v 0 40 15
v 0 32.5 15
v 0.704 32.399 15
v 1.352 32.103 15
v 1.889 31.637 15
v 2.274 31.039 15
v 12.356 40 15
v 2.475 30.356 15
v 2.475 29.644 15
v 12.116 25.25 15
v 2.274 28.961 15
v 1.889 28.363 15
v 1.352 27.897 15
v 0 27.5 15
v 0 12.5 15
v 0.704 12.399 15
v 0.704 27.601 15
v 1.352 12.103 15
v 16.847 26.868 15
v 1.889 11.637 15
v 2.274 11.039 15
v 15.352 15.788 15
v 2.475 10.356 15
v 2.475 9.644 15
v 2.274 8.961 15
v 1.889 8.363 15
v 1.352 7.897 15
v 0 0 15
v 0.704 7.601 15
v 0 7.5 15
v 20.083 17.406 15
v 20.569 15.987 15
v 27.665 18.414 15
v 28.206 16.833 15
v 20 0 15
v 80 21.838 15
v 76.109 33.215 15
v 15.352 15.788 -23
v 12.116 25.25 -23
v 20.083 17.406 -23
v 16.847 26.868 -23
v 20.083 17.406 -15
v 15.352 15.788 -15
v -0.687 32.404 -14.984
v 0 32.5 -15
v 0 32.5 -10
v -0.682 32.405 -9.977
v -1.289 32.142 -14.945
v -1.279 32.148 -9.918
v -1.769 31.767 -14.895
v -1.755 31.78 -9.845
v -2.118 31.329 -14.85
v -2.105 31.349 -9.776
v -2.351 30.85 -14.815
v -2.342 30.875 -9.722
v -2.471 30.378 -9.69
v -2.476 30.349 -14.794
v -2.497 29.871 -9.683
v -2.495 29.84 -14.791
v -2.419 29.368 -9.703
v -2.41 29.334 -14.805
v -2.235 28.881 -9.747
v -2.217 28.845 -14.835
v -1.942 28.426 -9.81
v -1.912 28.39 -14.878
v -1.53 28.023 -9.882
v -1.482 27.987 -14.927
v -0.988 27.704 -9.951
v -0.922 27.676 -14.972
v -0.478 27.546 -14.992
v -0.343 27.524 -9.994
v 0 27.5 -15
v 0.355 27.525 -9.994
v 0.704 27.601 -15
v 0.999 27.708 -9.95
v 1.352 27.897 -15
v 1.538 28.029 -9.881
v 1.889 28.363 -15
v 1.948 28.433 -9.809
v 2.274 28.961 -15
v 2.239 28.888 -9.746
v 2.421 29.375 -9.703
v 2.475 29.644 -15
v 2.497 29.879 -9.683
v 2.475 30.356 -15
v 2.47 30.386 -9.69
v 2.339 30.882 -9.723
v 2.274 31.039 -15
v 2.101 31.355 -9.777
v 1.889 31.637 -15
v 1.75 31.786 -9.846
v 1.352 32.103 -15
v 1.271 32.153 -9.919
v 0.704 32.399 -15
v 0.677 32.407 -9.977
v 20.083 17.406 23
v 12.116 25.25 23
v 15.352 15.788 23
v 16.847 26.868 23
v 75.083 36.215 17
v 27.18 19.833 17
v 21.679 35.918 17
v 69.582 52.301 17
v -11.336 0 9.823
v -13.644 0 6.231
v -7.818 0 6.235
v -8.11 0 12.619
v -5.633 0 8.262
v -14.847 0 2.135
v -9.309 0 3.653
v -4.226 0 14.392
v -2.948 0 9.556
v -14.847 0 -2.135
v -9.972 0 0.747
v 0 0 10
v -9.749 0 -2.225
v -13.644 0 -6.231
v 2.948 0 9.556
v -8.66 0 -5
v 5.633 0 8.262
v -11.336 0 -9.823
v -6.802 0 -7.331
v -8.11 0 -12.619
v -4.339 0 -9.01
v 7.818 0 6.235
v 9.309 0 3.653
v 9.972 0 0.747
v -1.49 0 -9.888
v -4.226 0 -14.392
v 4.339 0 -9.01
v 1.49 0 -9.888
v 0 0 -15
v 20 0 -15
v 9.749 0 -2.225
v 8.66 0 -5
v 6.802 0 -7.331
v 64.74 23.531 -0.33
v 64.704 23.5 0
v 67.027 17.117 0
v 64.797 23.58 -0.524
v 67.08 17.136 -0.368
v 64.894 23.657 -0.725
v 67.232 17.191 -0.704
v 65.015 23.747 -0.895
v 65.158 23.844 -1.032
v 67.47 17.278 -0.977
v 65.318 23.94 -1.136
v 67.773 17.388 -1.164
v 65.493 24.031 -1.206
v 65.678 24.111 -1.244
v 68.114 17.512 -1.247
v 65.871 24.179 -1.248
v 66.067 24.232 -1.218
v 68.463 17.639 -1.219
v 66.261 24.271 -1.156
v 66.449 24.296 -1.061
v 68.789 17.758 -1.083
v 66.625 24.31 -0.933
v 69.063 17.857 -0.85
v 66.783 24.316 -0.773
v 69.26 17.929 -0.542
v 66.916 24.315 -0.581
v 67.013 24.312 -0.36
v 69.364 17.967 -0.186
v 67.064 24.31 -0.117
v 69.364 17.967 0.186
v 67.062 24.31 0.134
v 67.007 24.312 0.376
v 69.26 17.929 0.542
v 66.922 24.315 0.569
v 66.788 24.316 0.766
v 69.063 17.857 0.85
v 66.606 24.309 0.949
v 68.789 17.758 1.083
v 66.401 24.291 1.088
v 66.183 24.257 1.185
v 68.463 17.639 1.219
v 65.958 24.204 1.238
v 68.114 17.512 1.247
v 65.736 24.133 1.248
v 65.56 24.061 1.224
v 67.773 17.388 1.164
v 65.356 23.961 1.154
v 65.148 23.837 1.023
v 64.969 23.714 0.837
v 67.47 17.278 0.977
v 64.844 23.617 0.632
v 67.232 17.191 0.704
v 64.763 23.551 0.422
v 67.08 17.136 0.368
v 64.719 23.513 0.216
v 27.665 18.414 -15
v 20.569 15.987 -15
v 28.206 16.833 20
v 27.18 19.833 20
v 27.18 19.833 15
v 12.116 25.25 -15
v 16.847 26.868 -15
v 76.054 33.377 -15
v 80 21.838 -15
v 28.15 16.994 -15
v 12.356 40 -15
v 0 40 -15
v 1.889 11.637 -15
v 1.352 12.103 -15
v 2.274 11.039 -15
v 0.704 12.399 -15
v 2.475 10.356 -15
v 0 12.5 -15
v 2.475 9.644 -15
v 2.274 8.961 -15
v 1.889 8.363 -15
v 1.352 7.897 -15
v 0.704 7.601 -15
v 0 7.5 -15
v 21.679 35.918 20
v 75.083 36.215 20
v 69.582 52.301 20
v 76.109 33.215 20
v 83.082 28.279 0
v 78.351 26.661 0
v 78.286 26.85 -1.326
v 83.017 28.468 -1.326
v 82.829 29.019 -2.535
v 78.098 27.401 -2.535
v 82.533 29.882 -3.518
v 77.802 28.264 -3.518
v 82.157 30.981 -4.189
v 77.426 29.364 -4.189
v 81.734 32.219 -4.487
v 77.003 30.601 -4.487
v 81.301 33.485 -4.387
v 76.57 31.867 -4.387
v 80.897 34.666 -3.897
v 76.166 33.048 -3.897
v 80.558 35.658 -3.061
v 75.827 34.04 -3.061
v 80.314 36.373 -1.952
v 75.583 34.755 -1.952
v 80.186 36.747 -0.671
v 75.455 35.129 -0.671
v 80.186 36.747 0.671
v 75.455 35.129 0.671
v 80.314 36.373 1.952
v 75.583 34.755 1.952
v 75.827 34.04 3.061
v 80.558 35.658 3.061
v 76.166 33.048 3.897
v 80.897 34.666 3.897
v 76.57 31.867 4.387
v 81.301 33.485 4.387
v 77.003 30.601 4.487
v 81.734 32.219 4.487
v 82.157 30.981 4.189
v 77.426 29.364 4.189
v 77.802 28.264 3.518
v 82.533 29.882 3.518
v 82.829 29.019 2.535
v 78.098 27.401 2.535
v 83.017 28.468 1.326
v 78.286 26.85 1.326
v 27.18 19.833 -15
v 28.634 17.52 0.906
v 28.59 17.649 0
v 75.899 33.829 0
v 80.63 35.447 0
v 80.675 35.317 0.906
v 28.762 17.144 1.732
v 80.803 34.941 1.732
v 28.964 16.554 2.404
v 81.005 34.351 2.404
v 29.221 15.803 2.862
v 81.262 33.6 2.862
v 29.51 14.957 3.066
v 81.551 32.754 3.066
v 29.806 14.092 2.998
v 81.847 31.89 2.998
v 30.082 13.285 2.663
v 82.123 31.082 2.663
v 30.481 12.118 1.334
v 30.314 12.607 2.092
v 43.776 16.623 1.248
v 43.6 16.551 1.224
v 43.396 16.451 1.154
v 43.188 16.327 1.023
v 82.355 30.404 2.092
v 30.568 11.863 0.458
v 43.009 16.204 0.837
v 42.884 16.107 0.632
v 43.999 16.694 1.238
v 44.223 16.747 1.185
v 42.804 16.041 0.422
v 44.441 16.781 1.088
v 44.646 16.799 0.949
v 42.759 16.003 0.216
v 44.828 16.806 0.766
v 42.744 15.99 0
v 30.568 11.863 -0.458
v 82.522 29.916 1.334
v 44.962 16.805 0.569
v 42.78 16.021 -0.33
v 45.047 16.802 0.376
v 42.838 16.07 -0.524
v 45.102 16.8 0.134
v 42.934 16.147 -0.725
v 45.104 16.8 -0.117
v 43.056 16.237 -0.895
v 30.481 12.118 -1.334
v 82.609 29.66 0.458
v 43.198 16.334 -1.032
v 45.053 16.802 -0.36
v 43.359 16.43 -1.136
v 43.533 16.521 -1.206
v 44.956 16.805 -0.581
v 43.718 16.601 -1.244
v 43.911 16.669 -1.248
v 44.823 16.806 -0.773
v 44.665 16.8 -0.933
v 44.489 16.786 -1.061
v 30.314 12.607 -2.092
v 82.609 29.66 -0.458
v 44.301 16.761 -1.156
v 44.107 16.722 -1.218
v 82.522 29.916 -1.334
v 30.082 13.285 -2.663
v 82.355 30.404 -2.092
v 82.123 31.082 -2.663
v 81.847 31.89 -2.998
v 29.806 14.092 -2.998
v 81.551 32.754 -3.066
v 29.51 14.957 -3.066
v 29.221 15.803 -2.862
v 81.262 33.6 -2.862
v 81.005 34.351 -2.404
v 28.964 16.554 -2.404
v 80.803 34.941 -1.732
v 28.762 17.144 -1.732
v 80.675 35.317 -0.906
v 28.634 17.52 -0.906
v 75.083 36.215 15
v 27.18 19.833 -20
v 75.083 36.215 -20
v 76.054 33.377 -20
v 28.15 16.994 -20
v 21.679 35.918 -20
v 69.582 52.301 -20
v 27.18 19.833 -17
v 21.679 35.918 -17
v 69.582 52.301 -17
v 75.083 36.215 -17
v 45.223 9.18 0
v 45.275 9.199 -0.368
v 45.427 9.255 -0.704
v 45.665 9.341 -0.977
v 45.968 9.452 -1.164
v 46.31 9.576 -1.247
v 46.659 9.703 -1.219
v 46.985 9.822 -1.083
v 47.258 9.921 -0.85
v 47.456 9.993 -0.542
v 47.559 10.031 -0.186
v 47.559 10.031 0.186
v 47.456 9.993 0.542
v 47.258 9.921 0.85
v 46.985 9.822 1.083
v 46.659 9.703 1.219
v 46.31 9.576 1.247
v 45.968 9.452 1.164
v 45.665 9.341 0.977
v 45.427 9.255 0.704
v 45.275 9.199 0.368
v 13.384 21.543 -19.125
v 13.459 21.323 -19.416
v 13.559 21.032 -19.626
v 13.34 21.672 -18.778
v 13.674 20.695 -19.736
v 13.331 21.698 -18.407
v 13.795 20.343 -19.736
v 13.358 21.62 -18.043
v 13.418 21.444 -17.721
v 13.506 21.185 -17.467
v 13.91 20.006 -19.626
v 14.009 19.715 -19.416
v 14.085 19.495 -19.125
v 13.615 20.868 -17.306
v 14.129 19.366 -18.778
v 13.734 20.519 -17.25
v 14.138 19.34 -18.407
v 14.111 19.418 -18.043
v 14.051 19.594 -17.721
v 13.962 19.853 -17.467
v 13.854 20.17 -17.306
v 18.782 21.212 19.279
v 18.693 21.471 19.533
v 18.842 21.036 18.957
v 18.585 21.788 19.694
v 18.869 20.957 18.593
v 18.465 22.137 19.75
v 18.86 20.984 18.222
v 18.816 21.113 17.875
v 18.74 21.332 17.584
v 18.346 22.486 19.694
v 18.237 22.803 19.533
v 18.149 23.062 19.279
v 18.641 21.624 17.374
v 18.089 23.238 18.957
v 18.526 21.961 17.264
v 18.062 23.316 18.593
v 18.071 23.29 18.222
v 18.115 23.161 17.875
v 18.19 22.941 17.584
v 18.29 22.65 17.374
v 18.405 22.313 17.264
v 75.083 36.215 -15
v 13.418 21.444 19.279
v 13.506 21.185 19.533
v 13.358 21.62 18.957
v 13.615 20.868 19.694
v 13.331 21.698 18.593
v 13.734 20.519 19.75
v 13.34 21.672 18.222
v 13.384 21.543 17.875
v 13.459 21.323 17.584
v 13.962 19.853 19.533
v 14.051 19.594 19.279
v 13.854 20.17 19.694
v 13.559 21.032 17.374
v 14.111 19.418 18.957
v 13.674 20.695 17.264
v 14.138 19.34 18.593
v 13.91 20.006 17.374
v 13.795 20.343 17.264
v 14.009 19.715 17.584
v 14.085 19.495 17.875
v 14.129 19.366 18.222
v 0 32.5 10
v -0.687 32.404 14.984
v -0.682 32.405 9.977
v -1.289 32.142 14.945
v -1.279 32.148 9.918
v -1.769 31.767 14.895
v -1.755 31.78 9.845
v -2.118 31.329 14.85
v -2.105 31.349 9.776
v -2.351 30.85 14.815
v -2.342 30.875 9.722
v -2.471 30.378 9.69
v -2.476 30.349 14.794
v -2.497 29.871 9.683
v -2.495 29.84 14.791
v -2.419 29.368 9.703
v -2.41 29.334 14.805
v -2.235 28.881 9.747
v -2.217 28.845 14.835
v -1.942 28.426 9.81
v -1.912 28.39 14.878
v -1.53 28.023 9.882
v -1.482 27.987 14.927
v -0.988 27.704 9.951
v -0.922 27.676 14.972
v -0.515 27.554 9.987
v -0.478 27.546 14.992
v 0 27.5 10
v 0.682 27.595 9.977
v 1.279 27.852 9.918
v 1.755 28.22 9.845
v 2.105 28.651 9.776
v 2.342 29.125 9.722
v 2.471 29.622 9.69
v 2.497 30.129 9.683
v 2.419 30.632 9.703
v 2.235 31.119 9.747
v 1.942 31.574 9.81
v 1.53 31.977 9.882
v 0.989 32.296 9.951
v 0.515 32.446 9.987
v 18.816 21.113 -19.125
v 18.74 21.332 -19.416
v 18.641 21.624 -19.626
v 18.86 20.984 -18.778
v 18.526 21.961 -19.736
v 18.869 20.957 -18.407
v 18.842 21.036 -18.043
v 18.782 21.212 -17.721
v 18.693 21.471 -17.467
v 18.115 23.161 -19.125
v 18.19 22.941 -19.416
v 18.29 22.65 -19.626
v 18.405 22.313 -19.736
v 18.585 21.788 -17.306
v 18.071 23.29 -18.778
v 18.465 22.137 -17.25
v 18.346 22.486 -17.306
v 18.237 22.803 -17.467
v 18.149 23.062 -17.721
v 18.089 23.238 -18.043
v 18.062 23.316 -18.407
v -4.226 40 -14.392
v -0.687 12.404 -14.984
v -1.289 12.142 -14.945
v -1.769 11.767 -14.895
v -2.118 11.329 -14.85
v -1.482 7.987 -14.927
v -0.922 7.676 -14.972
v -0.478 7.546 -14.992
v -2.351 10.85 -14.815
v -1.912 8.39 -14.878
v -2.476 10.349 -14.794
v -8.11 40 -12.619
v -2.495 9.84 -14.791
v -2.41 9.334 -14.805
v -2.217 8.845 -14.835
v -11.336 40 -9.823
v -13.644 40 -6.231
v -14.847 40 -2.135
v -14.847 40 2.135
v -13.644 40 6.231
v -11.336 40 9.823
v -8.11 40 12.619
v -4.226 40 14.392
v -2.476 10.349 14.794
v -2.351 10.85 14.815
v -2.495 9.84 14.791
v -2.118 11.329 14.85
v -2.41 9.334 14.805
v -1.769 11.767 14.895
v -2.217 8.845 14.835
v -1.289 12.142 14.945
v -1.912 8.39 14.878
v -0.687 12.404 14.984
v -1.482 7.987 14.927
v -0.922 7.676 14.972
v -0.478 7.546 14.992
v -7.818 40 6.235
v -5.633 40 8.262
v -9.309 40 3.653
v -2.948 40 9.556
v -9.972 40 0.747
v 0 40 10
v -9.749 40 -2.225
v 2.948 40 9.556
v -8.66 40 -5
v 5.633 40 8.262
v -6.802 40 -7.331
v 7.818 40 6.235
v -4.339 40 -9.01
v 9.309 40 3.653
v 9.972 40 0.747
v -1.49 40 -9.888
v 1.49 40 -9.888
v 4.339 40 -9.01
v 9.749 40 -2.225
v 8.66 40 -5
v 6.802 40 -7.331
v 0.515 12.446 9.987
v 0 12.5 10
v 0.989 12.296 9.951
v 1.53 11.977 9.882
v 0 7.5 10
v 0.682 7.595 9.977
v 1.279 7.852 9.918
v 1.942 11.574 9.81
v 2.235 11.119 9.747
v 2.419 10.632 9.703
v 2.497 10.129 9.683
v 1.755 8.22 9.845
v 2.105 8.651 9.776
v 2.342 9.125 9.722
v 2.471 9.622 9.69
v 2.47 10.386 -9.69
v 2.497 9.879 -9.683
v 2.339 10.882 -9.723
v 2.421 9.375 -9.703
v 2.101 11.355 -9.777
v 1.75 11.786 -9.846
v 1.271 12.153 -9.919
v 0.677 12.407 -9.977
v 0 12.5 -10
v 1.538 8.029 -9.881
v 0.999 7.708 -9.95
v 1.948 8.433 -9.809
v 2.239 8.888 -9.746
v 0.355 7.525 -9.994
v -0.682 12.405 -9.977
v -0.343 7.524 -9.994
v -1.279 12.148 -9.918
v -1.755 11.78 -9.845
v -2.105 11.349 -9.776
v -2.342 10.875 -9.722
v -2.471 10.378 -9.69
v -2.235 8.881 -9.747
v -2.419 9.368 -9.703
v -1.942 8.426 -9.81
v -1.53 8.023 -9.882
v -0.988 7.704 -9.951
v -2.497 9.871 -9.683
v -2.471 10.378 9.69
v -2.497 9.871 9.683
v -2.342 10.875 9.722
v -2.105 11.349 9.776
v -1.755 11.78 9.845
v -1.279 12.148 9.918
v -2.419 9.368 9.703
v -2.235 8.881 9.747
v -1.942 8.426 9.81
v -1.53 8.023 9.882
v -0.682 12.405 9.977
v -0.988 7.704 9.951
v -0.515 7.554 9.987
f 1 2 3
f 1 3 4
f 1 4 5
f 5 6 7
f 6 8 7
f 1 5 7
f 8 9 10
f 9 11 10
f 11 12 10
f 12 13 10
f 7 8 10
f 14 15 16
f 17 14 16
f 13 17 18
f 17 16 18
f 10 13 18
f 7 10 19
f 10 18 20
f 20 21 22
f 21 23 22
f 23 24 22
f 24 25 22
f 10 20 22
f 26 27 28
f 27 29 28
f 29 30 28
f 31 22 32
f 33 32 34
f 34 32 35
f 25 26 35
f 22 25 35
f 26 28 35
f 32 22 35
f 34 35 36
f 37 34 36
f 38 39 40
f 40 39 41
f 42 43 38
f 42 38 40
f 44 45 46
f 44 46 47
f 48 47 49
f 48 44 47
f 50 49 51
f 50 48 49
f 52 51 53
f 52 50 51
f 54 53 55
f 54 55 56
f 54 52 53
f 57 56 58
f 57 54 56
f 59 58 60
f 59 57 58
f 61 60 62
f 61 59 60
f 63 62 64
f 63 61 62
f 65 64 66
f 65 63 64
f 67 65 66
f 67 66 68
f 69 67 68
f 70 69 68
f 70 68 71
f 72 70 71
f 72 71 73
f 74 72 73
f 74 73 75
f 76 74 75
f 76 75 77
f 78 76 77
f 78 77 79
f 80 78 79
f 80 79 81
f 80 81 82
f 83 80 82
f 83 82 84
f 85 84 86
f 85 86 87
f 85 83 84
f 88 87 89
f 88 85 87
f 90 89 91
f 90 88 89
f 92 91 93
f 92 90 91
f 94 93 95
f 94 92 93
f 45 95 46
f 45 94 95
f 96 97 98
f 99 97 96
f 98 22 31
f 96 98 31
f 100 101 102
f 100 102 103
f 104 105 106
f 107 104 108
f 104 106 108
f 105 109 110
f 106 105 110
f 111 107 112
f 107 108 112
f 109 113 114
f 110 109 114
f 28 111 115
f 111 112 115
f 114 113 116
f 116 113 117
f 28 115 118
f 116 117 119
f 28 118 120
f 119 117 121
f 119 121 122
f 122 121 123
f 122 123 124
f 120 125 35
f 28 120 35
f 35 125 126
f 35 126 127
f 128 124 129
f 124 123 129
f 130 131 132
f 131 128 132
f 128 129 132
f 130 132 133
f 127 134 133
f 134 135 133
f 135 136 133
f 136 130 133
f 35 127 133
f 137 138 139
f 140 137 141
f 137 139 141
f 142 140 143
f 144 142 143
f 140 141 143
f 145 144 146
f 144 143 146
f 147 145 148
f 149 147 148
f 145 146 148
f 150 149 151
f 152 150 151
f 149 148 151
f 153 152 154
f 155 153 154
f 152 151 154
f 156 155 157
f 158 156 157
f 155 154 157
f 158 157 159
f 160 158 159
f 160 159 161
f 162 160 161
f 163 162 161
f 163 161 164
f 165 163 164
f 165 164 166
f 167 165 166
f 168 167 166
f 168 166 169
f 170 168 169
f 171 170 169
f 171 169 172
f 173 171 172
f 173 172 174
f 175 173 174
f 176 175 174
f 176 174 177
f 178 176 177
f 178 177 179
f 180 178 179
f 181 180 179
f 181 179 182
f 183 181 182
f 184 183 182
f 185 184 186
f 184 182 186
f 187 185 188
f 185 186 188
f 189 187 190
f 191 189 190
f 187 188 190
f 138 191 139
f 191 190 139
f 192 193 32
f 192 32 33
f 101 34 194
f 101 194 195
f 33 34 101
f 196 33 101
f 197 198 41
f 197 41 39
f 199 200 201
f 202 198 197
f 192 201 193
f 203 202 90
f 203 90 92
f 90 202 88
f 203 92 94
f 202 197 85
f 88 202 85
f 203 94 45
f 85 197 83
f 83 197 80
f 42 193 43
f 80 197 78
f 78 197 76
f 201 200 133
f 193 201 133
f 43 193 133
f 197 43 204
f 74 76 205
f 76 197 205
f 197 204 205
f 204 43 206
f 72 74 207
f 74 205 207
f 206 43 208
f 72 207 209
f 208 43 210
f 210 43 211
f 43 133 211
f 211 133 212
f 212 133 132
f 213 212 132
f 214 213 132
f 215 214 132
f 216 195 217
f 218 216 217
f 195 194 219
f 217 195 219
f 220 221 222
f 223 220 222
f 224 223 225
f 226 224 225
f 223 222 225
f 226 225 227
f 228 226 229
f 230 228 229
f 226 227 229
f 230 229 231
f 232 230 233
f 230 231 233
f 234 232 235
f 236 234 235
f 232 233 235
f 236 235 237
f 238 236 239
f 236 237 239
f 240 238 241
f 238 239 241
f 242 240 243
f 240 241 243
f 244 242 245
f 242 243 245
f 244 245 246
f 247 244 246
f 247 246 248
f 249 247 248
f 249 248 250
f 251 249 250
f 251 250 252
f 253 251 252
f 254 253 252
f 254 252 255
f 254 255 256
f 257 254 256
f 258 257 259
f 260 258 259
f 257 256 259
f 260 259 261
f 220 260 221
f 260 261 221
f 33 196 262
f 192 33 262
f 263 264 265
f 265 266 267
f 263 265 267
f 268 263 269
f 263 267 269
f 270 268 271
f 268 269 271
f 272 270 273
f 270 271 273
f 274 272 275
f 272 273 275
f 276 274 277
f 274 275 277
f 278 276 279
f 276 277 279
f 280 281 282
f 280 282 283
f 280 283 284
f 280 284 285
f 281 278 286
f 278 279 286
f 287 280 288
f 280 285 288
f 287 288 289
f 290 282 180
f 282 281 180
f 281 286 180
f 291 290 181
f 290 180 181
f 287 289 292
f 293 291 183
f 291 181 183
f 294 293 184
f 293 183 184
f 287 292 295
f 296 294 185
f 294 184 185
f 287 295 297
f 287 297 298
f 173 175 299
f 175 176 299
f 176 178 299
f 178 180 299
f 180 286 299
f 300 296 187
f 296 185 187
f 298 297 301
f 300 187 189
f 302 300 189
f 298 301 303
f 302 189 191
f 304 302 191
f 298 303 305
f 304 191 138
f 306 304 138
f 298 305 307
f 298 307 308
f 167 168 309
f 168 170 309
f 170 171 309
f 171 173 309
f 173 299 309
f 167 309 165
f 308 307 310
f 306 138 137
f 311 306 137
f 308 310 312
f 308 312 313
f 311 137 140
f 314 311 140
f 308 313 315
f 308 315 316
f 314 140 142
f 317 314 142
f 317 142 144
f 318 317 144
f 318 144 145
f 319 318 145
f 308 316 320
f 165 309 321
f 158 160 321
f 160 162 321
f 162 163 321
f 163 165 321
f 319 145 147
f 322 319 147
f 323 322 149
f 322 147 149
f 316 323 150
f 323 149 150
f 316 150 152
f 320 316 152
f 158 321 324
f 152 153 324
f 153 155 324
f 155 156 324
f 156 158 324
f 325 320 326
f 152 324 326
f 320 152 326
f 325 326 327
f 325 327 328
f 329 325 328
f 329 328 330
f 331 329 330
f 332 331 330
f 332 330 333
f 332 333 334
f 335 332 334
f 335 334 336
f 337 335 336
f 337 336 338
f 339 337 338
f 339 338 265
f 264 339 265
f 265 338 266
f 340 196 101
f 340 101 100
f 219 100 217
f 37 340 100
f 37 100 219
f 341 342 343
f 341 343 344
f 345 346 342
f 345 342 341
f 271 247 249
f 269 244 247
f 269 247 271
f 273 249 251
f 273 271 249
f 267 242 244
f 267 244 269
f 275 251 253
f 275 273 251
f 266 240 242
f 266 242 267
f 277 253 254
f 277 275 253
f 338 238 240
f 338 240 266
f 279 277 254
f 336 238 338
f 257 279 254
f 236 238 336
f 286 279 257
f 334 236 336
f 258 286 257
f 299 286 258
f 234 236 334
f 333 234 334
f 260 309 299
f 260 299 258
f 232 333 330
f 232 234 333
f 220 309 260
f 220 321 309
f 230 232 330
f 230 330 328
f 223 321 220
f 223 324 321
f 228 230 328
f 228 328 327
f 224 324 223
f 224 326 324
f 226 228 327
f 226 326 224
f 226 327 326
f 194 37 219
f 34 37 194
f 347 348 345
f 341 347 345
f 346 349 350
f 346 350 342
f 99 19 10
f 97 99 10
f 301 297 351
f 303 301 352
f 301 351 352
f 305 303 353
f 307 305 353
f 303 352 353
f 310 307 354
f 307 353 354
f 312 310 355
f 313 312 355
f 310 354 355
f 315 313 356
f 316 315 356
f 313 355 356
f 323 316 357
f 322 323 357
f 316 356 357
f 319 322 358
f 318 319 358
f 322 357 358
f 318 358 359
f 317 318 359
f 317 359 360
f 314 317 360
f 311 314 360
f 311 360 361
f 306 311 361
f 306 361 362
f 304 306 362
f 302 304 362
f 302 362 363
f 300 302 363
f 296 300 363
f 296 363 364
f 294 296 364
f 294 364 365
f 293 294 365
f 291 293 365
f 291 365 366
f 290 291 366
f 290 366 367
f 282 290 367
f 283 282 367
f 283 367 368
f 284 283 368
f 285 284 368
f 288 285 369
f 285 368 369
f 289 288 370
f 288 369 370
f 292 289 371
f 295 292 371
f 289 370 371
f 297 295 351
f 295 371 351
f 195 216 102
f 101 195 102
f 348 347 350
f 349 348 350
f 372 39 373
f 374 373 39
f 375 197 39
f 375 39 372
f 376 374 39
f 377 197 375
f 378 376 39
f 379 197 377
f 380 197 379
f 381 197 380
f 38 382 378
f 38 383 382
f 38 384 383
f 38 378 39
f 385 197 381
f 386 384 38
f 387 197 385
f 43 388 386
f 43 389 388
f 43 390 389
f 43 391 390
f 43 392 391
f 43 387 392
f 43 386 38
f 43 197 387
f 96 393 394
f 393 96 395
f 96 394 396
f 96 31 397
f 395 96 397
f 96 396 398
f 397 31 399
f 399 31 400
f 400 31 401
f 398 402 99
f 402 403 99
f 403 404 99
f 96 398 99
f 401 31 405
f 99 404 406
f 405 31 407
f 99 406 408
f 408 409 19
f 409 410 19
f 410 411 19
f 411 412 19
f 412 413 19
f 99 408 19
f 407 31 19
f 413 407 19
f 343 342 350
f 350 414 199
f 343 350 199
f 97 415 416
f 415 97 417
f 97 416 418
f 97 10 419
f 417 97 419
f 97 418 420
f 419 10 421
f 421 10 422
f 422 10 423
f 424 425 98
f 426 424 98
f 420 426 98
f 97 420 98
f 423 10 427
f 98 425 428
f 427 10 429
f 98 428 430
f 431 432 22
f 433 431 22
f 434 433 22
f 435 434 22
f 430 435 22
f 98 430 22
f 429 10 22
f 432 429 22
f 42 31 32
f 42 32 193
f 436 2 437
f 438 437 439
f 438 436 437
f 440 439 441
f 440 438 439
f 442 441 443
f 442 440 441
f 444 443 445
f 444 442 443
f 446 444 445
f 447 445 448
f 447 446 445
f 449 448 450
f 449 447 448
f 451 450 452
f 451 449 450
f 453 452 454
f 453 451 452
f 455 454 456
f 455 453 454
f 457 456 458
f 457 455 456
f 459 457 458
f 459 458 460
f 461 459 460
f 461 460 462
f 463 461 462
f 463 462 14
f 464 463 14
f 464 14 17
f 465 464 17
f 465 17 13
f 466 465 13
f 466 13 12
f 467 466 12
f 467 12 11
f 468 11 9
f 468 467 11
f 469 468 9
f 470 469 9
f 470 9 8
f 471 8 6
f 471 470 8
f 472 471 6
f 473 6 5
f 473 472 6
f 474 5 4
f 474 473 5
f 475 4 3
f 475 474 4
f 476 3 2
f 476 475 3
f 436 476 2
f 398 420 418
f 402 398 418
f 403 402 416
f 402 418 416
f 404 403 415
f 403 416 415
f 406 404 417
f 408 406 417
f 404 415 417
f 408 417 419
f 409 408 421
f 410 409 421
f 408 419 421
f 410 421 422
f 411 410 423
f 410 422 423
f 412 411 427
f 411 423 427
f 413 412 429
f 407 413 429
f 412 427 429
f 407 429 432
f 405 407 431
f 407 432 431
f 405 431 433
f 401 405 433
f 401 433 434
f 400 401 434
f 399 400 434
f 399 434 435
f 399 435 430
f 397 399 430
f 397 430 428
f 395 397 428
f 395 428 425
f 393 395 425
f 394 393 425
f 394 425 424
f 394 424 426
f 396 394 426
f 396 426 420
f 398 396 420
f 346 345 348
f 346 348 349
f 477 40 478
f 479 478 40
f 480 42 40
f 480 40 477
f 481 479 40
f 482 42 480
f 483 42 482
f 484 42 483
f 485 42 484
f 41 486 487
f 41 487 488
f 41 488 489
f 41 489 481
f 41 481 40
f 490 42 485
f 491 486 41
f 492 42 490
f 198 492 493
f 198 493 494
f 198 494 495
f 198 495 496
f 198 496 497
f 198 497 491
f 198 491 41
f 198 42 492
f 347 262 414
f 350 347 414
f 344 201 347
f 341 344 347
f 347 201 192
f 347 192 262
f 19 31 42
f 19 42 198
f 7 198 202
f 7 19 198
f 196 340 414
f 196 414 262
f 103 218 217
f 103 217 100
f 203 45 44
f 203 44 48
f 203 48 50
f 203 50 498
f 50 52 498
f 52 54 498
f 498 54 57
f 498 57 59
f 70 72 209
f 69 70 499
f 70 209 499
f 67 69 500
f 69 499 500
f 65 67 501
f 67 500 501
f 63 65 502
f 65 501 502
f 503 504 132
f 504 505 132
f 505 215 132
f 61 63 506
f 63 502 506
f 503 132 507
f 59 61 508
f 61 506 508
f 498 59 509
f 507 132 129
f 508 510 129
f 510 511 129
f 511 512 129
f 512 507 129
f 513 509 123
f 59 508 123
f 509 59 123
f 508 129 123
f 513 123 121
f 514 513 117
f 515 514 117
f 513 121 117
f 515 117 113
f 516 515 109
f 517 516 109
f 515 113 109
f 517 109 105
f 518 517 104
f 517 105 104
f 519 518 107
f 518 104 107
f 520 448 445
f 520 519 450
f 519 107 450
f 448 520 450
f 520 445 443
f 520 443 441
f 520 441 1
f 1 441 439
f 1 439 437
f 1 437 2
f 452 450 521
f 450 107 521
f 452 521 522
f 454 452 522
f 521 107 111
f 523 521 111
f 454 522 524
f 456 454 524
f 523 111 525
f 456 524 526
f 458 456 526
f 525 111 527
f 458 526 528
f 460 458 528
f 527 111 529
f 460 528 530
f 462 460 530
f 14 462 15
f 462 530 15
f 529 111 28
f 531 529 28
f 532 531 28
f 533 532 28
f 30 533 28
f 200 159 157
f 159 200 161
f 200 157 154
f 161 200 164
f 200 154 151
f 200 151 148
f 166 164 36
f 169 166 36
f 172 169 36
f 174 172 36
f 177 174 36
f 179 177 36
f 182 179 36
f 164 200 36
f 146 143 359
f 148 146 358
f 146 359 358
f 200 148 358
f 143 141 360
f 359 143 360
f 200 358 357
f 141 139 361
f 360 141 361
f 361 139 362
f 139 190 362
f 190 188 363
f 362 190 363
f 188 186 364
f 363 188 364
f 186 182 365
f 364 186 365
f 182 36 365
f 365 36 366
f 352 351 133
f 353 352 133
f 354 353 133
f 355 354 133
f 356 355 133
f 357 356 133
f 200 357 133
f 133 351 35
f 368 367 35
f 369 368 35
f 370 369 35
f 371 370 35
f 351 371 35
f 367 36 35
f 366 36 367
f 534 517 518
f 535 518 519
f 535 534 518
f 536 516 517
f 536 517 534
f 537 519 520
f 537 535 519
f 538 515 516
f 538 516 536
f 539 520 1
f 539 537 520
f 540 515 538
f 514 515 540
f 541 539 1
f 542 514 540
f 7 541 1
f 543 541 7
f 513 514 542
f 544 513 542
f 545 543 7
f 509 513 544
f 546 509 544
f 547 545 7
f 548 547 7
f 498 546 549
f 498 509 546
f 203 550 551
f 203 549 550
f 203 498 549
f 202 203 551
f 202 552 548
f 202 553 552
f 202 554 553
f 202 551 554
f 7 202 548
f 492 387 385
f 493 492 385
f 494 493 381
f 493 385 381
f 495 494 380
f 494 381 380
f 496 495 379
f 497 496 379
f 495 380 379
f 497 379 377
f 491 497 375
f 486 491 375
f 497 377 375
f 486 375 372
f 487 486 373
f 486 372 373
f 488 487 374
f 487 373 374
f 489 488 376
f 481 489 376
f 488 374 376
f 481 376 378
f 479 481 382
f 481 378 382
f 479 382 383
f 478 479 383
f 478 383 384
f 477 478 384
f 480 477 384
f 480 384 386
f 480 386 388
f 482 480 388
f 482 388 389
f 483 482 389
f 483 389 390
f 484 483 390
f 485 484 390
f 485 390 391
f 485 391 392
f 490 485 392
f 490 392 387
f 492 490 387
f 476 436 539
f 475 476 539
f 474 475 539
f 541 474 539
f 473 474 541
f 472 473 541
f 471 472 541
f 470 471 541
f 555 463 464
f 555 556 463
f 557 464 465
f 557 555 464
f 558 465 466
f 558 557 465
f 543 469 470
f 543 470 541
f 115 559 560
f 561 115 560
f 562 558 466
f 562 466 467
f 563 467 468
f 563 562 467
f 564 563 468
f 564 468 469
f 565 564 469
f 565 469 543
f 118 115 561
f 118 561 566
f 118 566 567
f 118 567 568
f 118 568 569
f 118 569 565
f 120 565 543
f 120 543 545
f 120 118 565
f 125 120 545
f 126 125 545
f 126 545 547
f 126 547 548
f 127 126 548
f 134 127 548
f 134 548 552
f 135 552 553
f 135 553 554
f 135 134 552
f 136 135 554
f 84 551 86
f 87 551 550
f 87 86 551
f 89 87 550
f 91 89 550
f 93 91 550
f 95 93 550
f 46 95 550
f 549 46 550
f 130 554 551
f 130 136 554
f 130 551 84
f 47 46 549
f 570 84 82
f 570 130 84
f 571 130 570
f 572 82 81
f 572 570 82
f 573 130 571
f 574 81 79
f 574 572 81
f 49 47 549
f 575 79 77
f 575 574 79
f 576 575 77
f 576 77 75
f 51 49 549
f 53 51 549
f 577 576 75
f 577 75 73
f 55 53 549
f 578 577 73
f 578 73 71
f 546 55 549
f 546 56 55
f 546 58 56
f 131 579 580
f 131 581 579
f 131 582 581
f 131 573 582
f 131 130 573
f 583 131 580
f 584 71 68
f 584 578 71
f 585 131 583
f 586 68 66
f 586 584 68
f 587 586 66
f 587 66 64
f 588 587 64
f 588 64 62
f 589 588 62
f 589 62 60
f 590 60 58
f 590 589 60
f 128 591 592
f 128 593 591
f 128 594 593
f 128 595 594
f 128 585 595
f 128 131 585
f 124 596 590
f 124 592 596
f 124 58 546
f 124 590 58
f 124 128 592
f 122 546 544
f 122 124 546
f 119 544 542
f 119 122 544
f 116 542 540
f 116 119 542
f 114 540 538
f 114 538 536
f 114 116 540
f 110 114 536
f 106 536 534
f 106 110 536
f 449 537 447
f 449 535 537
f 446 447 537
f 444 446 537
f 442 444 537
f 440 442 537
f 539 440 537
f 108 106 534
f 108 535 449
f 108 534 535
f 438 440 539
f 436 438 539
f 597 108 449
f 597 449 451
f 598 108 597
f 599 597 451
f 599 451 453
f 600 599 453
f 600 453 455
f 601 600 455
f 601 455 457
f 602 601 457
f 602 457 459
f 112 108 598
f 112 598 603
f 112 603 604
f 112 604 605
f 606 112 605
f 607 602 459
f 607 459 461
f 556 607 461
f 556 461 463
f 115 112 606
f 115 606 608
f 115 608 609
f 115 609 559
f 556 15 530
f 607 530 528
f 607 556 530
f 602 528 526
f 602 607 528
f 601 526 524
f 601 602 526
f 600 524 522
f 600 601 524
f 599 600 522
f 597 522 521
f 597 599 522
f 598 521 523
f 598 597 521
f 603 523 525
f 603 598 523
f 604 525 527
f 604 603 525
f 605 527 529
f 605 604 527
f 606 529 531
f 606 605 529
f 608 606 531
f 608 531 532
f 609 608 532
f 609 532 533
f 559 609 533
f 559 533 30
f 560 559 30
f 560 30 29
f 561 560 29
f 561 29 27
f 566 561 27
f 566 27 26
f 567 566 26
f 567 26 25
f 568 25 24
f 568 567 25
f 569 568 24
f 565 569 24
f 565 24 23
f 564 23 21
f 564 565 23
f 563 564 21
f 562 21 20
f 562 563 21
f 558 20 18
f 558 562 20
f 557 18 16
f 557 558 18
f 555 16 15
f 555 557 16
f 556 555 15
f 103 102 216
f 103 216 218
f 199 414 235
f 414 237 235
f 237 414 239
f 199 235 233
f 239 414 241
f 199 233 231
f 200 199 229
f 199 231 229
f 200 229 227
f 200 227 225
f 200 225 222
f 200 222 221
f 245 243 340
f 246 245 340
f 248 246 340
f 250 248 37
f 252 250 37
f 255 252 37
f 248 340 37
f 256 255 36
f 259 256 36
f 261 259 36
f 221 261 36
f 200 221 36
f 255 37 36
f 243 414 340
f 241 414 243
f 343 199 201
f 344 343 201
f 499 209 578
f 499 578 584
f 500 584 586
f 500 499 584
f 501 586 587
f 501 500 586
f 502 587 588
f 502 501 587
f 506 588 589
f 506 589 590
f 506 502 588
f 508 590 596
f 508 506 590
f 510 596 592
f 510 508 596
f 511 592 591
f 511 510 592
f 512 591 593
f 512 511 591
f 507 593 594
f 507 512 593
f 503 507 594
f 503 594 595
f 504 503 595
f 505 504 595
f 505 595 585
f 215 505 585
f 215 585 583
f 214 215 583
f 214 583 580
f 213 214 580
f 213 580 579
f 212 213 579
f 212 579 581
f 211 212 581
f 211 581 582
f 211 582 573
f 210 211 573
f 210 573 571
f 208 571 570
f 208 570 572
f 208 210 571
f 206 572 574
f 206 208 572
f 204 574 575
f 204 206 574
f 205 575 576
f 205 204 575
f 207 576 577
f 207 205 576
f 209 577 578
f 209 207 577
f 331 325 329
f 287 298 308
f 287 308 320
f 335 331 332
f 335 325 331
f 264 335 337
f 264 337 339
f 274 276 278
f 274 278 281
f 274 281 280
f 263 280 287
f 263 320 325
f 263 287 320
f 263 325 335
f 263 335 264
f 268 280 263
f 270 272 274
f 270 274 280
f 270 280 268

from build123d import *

# Parameters (mm, degrees)
ESQUISSE1_R                  = 10
BOSS_EXTRU_1_DEPTH           = 40
ENL_V_MAT_EXTRU_1_DEPTH      = 95.339811321
ENL_V_MAT_EXTRU_2_DEPTH      = 95.339811321
ESQUISSE5_R                  = 3.075
ENL_V_MAT_EXTRU_3_DEPTH      = 50
ENL_V_MAT_EXTRU_4_DEPTH      = 95.339811321
TROU_TARAUD_M31_REACH        = 93.715
TROU_TARAUD_M31_BORE_R       = 1.25
BOSS_EXTRU_2_DEPTH           = 8
BOSS_EXTRU_3_DEPTH           = 8
ESQUISSE19_W                 = 7.5
ESQUISSE19_H                 = 30
ENL_V_MAT_EXTRU_5_DEPTH      = 1.5
BOSS_EXTRU_4_DEPTH           = 5
BOSS_EXTRU_5_DEPTH           = 5
ESQUISSE36_W                 = 50.627353798
ESQUISSE36_H                 = 3
BOSS_EXTRU_6_DEPTH           = 17
TROU_TARAUD_M35_D            = 2.5
TROU_TARAUD_M35_DEPTH        = 5
ESQUISSE40_R                 = 4.5
BOSS_EXTRU_8_DEPTH           = 5
ESQUISSE41_R                 = 3.075
ENL_V_MAT_EXTRU_7_DEPTH      = 5
ENL_V_MAT_EXTRU_8_DEPTH      = 101.831047543
ENL_V_MAT_EXTRU_8_DEPTH_BACK = 101.831047543
ESQUISSE42_R                 = 2.5


with BuildPart() as part:
    # Esquisse1 → Boss.-Extru.1 (new body)
    with BuildSketch(Plane(origin=(0, 0, 0), x_dir=(1, 0, 0), z_dir=(0, 1, 0))):
        with BuildLine():
            Line((0, -15), (80, -15))
            Line((80, -15), (80, 15))
            Line((80, 15), (0, 15))
            ThreePointArc((0, 15), (-15, 0), (0, -15))
        make_face()
        with Locations(Location((0, 0, 0), (0, 0, 270))):
            Circle(ESQUISSE1_R, mode=Mode.SUBTRACT)
    extrude(amount=BOSS_EXTRU_1_DEPTH)

    # Esquisse3 → Enlèv. mat.-Extru.1 (cut, through all)
    with BuildSketch(Plane.XY.offset(15)):
        Polygon((20, 0), (80, 0), (80, 21.8382), align=None)
    extrude(amount=-ENL_V_MAT_EXTRU_1_DEPTH, mode=Mode.SUBTRACT)

    # Esquisse4 → Enlèv. mat.-Extru.2 (cut, through all)
    with BuildSketch(Plane.XY.offset(15)):
        Polygon((80, 21.8382), (80, 40), (73.7889, 40), align=None)
    extrude(amount=-ENL_V_MAT_EXTRU_2_DEPTH, mode=Mode.SUBTRACT)

    # Esquisse5 → Enlèv. mat.-Extru.3 (cut)
    with BuildSketch(Plane(origin=(78.309664358, 26.780889355, 0), x_dir=(0, 0, -1), z_dir=(0.9461982424164683, 0.32358752455554646, 0))):
        with Locations(Location((0, 4.37351335, 0), (0, 0, 90))):
            Circle(ESQUISSE5_R)
    extrude(amount=-ENL_V_MAT_EXTRU_3_DEPTH, mode=Mode.SUBTRACT)

    # Esquisse6 → Enlèv. mat.-Extru.4 (cut, through all)
    with BuildSketch(Plane.XY.offset(15)):
        Polygon((75.083250098, 36.21520703), (20.083250098, 17.405920506), (12.356368008, 40), (73.7889, 40), align=None)
    extrude(amount=-ENL_V_MAT_EXTRU_4_DEPTH, mode=Mode.SUBTRACT)

    # Trou taraudé M31 bore → Trou taraudé M31 (cut, up to next)
    with BuildSketch(Plane(origin=(2.339552909, -6.427872928, 0), x_dir=(-0.9396926915369543, -0.3420199489387053, 0), z_dir=(0.3420199489387053, -0.9396926915369543, 0)), mode=Mode.PRIVATE) as trou_taraud_m31_sk1:
        with Locations((-46.885275043, 0)):
            Circle(TROU_TARAUD_M31_BORE_R)
    trou_taraud_m31_tool1 = extrude(trou_taraud_m31_sk1.sketch, amount=-TROU_TARAUD_M31_REACH, mode=Mode.PRIVATE) & part.part
    # Trou taraudé M31 bore → Trou taraudé M31 (cut, up to next)
    with BuildSketch(Plane(origin=(2.339552909, -6.427872928, 0), x_dir=(-0.9396926915369543, -0.3420199489387053, 0), z_dir=(0.3420199489387053, -0.9396926915369543, 0)), mode=Mode.PRIVATE) as trou_taraud_m31_sk2:
        with Locations((-70.089378087, 0)):
            Circle(TROU_TARAUD_M31_BORE_R)
    trou_taraud_m31_tool2 = extrude(trou_taraud_m31_sk2.sketch, amount=-TROU_TARAUD_M31_REACH, mode=Mode.PRIVATE) & part.part
    add(trou_taraud_m31_tool1.solids().sort_by_distance((46.397303, 9.607826, 0))[0], mode=Mode.SUBTRACT)
    add(trou_taraud_m31_tool2.solids().sort_by_distance((68.202029, 17.544093, 0))[0], mode=Mode.SUBTRACT)

    # Esquisse11 → Boss.-Extru.2 (add)
    with BuildSketch(Plane.XY.offset(15)):
        Polygon((20.083250098, 17.405920506), (16.847374853, 26.86790293), (12.116383641, 25.249965307), (15.352258886, 15.787982883), align=None)
    extrude(amount=BOSS_EXTRU_2_DEPTH)

    # Esquisse12 → Boss.-Extru.3 (add)
    with BuildSketch(Plane(origin=(0, 0, -15), x_dir=(-1, 0, 0), z_dir=(0, 0, -1))):
        Polygon((-20.083250098, 17.405920506), (-16.847374853, 26.86790293), (-12.116383641, 25.249965307), (-15.352258886, 15.787982883), align=None)
    extrude(amount=BOSS_EXTRU_3_DEPTH)

    # Esquisse19 → Enlèv. mat.-Extru.5 (cut)
    with BuildSketch(Plane(origin=(-3.22641426, 9.434317675, 0), x_dir=(0.9461982424164682, 0.3235875245555466, 0), z_dir=(-0.3235875245555466, 0.9461982424164682, 0))):
        with Locations((28.385074674, 0)):
            Rectangle(ESQUISSE19_W, ESQUISSE19_H)
    extrude(amount=-ENL_V_MAT_EXTRU_5_DEPTH, mode=Mode.SUBTRACT)

    # Esquisse34 → Boss.-Extru.4 (add)
    with BuildSketch(Plane.XY.offset(15)):
        Polygon((27.179736916, 19.83282694), (75.083250098, 36.21520703), (76.109211181, 33.21520703), (28.205697999, 16.83282694), align=None)
    extrude(amount=BOSS_EXTRU_4_DEPTH)

    # Esquisse35 → Boss.-Extru.5 (add)
    with BuildSketch(Plane(origin=(0, 0, -15), x_dir=(-1, 0, 0), z_dir=(0, 0, -1))):
        Polygon((-27.179736916, 19.83282694), (-75.083250098, 36.21520703), (-76.054012672, 33.376612303), (-28.15049949, 16.994232213), align=None)
    extrude(amount=BOSS_EXTRU_5_DEPTH)

    # Esquisse36 → Boss.-Extru.6 (add)
    with BuildSketch(Plane(origin=(-3.22641426, 9.434317675, 0), x_dir=(0.9461982424164682, 0.3235875245555466, 0), z_dir=(-0.3235875245555466, 0.9461982424164682, 0))):
        with Locations((57.448751573, -18.5)):
            Rectangle(ESQUISSE36_W, ESQUISSE36_H)
        with Locations((57.448751573, 18.5)):
            Rectangle(ESQUISSE36_W, ESQUISSE36_H)
    extrude(amount=BOSS_EXTRU_6_DEPTH)

    # Trou taraudé M35
    with Locations(Plane(origin=(23.309664358, 7.971602831, 0), x_dir=(0, 0, -1), z_dir=(0.9461982424164682, 0.3235875245555468, 0))):
        with Locations((-18.5, 14.970762206), (18.5, 14.970762206)):
            Hole(TROU_TARAUD_M35_D / 2, depth=TROU_TARAUD_M35_DEPTH)

    # Esquisse40 → Boss.-Extru.8 (add)
    with BuildSketch(Plane(origin=(78.309664358, 26.780889355, 0), x_dir=(0, 0, -1), z_dir=(0.9461982424164683, 0.32358752455554646, 0))):
        with Locations(Location((0, 4.37351335, 0), (0, 0, 270))):
            Circle(ESQUISSE40_R)
    extrude(amount=BOSS_EXTRU_8_DEPTH)

    # Esquisse41 → Enlèv. mat.-Extru.7 (cut)
    with BuildSketch(Plane(origin=(83.04065557, 28.398826978, 0), x_dir=(0, 0, -1), z_dir=(0.9461982424164683, 0.32358752455554646, 0))):
        with Locations(Location((0, 4.37351335, 0), (0, 0, 90))):
            Circle(ESQUISSE41_R)
    extrude(amount=-ENL_V_MAT_EXTRU_7_DEPTH, mode=Mode.SUBTRACT)

    # Esquisse42 → Enlèv. mat.-Extru.8 (cut, two sides: drawn at the far end of the back side and taken through both)
    with BuildSketch(Plane.XY.offset(-ENL_V_MAT_EXTRU_8_DEPTH_BACK)):
        with Locations(Location((0, 30, 0), (0, 0, 90.000000004))):
            Circle(ESQUISSE42_R)
        with Locations(Location((0, 10, 0), (0, 0, 90.000000004))):
            Circle(ESQUISSE42_R)
    extrude(amount=ENL_V_MAT_EXTRU_8_DEPTH + ENL_V_MAT_EXTRU_8_DEPTH_BACK, mode=Mode.SUBTRACT)


solid = part.part
